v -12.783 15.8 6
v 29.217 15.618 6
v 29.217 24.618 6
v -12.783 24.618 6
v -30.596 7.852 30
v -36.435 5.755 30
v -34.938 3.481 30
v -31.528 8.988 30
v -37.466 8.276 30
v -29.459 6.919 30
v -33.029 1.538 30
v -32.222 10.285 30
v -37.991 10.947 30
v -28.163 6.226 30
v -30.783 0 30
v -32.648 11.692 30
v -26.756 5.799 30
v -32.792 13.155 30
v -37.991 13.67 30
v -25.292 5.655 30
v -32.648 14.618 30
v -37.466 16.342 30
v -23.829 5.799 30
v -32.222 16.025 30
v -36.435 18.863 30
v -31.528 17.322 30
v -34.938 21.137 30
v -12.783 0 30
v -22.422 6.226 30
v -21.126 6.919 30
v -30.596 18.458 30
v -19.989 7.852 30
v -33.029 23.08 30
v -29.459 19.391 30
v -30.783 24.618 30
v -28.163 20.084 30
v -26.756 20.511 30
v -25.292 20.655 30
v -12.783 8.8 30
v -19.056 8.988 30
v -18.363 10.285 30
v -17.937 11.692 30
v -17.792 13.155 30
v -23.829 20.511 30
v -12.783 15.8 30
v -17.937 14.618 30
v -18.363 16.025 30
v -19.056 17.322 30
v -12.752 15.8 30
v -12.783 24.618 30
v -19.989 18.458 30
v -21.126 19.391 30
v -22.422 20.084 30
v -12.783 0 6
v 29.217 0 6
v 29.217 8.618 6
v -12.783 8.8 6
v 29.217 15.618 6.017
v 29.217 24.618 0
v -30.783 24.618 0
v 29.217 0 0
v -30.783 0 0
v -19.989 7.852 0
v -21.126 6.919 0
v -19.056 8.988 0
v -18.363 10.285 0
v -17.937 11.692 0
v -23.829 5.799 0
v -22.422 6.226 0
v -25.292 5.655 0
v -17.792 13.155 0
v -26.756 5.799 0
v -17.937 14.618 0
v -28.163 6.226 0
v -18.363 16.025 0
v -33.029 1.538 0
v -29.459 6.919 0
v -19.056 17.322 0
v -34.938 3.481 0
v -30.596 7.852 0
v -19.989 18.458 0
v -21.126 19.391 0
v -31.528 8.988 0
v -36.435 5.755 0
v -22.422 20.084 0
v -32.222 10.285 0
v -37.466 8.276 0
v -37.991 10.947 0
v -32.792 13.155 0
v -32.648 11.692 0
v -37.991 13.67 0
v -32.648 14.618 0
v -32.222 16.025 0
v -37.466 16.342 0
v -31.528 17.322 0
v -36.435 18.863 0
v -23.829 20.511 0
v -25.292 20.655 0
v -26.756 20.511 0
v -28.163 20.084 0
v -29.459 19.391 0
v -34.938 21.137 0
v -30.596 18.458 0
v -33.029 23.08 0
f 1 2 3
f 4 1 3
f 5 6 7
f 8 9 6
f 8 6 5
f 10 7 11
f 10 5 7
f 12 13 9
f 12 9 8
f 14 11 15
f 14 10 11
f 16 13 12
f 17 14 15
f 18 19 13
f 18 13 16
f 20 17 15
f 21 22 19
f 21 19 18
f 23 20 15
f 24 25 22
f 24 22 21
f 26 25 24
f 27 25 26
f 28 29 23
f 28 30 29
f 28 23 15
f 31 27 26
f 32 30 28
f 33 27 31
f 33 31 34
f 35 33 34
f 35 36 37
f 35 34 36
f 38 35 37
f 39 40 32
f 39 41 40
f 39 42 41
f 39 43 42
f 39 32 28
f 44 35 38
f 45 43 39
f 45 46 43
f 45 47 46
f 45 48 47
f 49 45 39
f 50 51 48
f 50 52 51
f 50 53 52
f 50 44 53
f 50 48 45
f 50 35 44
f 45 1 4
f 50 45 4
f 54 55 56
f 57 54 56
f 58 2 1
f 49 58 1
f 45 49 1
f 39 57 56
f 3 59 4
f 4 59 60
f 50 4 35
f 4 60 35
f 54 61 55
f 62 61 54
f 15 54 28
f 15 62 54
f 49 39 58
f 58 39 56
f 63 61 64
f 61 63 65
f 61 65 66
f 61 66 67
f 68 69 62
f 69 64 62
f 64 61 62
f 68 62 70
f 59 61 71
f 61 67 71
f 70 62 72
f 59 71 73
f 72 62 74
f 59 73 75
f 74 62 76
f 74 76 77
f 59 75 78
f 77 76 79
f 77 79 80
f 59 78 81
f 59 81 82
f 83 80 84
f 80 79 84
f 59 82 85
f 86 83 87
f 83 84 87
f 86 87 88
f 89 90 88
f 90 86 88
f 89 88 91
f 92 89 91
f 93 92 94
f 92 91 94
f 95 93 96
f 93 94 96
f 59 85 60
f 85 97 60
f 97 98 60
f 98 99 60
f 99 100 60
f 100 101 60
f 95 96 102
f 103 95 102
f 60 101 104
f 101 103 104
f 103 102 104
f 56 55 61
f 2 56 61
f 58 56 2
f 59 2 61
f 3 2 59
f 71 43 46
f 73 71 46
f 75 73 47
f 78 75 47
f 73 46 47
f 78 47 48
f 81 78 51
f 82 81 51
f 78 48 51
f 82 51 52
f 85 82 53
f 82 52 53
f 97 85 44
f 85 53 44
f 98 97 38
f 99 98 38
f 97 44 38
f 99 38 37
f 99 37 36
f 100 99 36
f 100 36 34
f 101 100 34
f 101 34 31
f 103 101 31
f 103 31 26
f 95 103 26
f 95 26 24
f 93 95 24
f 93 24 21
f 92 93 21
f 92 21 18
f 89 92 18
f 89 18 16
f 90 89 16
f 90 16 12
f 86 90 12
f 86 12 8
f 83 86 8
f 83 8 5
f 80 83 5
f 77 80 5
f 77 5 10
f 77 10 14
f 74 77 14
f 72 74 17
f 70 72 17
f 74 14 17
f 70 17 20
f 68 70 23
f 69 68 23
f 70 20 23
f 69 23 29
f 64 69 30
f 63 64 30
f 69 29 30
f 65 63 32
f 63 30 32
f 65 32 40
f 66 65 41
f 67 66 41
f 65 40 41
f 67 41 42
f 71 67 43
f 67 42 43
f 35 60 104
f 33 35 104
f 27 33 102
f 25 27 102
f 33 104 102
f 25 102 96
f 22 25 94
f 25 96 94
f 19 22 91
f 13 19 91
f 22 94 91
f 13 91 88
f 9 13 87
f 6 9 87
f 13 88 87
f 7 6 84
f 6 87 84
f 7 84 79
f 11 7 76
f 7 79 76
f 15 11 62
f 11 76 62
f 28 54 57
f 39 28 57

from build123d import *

# Parameters (mm, degrees)
F1_DEPTH = 30
F2_W     = 24.6179879843
F2_H     = 6
F3_DEPTH = 42
F5_DEPTH = 24
F7_DEPTH = 100
F8_R     = 7.5
F9_DEPTH = 100


with BuildPart() as f1:
    # F0 (on Top) → F1 (new body)
    with BuildSketch(Plane.XY):
        with BuildLine():
            Line((-12.7826083564, 24.6179879843), (-30.7826083564, 24.6179879843))
            ThreePointArc((-30.7826083564, 24.6179879843), (-38.0569803183, 12.3089939921), (-30.7826083564, 0))
            Line((-30.7826083564, 0), (-12.7826083564, 0))
            Line((-12.7826083564, 0), (-12.7826083564, 24.6179879843))
        make_face()
    extrude(amount=F1_DEPTH)

    # F2 (on face) → F3 (join)
    with BuildSketch(Plane.YZ.offset(-12.7826083564)):
        with Locations((12.3089939921, 3)):
            Rectangle(F2_W, F2_H)
    extrude(amount=F3_DEPTH)

    # F4 (on face) → F5 (join)
    with BuildSketch(Plane.XY.offset(6)):
        Polygon((29.2173916436, 15.6179879843), (-12.7826083564, 15.8001863448), (-12.7826083564, 8.8001863448), (29.2173916436, 8.6179879843), align=None)
    extrude(amount=F5_DEPTH)

    # F6 (on face) → F7 (cut)
    with BuildSketch(Plane(origin=(0.0379344366, 8.7445701096, 0), x_dir=(0.9999905908, -0.0043380154, 0), z_dir=(-0.0043380154, -0.9999905908, 0))):
        Polygon((29.1797317659, 30), (-12.8206634256, 30), (29.1797317659, 6), align=None)
    extrude(amount=-F7_DEPTH, mode=Mode.SUBTRACT)

    # F8 (on face) → F9 (cut)
    with BuildSketch(Plane.XY.offset(30)):
        with Locations((-25.2924282104, 13.1551967934)):
            Circle(F8_R)
    extrude(amount=-F9_DEPTH, mode=Mode.SUBTRACT)


solid = f1.part
